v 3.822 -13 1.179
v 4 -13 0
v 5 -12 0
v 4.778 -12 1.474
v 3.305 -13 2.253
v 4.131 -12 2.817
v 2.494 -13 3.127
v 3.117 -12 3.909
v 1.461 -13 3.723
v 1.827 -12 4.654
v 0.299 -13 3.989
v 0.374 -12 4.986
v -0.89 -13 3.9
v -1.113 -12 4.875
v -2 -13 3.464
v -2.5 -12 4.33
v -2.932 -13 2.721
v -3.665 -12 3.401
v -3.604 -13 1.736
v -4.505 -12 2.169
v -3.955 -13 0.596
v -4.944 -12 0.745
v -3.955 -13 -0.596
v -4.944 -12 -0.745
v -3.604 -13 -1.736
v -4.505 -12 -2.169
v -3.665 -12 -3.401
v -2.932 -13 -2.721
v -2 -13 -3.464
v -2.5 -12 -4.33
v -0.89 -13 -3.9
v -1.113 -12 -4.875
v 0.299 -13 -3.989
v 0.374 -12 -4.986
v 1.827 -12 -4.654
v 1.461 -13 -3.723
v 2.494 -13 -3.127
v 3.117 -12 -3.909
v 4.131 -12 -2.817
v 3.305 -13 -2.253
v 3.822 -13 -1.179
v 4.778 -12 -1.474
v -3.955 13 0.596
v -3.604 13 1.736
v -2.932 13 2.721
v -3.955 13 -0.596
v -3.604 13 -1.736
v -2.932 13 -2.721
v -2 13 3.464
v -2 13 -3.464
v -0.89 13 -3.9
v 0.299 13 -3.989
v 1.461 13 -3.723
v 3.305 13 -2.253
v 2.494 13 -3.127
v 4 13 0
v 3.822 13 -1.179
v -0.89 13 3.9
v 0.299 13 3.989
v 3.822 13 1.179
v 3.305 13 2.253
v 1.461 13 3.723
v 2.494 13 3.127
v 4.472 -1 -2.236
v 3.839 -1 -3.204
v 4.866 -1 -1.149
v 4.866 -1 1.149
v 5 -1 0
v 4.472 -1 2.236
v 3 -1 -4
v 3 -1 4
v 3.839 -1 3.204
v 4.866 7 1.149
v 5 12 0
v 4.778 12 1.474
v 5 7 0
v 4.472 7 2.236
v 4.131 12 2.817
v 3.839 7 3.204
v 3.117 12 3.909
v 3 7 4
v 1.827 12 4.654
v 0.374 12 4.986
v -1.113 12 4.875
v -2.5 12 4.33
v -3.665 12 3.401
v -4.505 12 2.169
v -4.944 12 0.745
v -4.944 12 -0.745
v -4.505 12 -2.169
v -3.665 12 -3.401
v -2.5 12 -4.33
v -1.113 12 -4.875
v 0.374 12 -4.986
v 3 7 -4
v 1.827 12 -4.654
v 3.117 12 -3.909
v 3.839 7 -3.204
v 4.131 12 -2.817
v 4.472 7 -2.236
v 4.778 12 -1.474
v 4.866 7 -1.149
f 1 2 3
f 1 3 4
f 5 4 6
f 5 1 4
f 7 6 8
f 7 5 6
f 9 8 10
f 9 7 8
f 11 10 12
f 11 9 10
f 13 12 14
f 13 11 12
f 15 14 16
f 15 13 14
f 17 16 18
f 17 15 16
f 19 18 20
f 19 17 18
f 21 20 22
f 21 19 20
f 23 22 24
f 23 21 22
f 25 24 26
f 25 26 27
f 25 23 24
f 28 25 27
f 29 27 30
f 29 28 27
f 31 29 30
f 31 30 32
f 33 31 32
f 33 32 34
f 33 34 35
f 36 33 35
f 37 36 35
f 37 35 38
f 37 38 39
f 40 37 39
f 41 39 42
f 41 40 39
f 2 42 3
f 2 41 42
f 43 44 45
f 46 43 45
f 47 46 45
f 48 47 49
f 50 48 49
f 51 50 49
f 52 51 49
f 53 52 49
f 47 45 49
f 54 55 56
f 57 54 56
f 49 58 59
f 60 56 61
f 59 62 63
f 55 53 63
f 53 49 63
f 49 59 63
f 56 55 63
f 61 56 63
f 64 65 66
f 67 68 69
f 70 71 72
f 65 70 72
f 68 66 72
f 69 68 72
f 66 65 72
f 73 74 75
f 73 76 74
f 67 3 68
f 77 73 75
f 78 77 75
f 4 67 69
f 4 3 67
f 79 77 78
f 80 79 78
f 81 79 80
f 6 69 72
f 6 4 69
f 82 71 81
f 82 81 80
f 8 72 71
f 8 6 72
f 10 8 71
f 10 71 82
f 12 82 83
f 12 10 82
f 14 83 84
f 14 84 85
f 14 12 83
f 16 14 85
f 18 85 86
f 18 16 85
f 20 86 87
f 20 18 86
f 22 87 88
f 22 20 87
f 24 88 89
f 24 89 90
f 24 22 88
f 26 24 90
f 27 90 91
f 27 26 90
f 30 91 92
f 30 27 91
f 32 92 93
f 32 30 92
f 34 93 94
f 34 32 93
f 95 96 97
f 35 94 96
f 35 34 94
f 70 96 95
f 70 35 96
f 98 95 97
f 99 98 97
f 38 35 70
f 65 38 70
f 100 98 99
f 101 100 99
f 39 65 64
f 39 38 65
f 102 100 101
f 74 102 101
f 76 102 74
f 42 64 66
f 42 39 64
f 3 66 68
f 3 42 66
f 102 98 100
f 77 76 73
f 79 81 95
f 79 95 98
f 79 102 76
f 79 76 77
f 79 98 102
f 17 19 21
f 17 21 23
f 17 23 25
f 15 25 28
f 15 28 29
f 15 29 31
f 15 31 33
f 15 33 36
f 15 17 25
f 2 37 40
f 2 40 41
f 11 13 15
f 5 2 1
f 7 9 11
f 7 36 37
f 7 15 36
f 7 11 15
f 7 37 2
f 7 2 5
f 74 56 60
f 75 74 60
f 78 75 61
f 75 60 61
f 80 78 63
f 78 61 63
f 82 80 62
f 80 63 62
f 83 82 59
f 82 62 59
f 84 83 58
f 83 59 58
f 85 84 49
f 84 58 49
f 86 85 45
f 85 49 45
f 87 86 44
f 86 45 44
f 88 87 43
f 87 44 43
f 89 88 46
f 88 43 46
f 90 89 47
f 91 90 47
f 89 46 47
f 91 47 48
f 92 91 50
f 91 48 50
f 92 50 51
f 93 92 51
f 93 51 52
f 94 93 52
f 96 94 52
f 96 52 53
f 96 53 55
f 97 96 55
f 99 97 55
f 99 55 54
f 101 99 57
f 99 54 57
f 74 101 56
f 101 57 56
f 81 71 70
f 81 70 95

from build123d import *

# Parameters (mm, degrees)
F0_R     = 5
F1_DEPTH = 13
F2_SIZE  = 1
F3_W     = 2
F3_H     = 8
F4_DEPTH = 12.5


with BuildPart() as f1:
    # F0 (on Front) → F1 (new body, symmetric)
    with BuildSketch(Plane.XZ):
        Circle(F0_R)
    extrude(amount=F1_DEPTH, both=True)

    # F2
    f2_edges = [f1.edges().sort_by_distance(p)[0] for p in [
        (-5, -13, 0),
        (-5, 13, 0),
    ]]
    chamfer(f2_edges, length=F2_SIZE)

    # F3 (on Top) → F4 (cut, symmetric)
    with BuildSketch(Plane.XY):
        with Locations((4, 3)):
            Rectangle(F3_W, F3_H)
    extrude(amount=F4_DEPTH, both=True, mode=Mode.SUBTRACT)


solid = f1.part
